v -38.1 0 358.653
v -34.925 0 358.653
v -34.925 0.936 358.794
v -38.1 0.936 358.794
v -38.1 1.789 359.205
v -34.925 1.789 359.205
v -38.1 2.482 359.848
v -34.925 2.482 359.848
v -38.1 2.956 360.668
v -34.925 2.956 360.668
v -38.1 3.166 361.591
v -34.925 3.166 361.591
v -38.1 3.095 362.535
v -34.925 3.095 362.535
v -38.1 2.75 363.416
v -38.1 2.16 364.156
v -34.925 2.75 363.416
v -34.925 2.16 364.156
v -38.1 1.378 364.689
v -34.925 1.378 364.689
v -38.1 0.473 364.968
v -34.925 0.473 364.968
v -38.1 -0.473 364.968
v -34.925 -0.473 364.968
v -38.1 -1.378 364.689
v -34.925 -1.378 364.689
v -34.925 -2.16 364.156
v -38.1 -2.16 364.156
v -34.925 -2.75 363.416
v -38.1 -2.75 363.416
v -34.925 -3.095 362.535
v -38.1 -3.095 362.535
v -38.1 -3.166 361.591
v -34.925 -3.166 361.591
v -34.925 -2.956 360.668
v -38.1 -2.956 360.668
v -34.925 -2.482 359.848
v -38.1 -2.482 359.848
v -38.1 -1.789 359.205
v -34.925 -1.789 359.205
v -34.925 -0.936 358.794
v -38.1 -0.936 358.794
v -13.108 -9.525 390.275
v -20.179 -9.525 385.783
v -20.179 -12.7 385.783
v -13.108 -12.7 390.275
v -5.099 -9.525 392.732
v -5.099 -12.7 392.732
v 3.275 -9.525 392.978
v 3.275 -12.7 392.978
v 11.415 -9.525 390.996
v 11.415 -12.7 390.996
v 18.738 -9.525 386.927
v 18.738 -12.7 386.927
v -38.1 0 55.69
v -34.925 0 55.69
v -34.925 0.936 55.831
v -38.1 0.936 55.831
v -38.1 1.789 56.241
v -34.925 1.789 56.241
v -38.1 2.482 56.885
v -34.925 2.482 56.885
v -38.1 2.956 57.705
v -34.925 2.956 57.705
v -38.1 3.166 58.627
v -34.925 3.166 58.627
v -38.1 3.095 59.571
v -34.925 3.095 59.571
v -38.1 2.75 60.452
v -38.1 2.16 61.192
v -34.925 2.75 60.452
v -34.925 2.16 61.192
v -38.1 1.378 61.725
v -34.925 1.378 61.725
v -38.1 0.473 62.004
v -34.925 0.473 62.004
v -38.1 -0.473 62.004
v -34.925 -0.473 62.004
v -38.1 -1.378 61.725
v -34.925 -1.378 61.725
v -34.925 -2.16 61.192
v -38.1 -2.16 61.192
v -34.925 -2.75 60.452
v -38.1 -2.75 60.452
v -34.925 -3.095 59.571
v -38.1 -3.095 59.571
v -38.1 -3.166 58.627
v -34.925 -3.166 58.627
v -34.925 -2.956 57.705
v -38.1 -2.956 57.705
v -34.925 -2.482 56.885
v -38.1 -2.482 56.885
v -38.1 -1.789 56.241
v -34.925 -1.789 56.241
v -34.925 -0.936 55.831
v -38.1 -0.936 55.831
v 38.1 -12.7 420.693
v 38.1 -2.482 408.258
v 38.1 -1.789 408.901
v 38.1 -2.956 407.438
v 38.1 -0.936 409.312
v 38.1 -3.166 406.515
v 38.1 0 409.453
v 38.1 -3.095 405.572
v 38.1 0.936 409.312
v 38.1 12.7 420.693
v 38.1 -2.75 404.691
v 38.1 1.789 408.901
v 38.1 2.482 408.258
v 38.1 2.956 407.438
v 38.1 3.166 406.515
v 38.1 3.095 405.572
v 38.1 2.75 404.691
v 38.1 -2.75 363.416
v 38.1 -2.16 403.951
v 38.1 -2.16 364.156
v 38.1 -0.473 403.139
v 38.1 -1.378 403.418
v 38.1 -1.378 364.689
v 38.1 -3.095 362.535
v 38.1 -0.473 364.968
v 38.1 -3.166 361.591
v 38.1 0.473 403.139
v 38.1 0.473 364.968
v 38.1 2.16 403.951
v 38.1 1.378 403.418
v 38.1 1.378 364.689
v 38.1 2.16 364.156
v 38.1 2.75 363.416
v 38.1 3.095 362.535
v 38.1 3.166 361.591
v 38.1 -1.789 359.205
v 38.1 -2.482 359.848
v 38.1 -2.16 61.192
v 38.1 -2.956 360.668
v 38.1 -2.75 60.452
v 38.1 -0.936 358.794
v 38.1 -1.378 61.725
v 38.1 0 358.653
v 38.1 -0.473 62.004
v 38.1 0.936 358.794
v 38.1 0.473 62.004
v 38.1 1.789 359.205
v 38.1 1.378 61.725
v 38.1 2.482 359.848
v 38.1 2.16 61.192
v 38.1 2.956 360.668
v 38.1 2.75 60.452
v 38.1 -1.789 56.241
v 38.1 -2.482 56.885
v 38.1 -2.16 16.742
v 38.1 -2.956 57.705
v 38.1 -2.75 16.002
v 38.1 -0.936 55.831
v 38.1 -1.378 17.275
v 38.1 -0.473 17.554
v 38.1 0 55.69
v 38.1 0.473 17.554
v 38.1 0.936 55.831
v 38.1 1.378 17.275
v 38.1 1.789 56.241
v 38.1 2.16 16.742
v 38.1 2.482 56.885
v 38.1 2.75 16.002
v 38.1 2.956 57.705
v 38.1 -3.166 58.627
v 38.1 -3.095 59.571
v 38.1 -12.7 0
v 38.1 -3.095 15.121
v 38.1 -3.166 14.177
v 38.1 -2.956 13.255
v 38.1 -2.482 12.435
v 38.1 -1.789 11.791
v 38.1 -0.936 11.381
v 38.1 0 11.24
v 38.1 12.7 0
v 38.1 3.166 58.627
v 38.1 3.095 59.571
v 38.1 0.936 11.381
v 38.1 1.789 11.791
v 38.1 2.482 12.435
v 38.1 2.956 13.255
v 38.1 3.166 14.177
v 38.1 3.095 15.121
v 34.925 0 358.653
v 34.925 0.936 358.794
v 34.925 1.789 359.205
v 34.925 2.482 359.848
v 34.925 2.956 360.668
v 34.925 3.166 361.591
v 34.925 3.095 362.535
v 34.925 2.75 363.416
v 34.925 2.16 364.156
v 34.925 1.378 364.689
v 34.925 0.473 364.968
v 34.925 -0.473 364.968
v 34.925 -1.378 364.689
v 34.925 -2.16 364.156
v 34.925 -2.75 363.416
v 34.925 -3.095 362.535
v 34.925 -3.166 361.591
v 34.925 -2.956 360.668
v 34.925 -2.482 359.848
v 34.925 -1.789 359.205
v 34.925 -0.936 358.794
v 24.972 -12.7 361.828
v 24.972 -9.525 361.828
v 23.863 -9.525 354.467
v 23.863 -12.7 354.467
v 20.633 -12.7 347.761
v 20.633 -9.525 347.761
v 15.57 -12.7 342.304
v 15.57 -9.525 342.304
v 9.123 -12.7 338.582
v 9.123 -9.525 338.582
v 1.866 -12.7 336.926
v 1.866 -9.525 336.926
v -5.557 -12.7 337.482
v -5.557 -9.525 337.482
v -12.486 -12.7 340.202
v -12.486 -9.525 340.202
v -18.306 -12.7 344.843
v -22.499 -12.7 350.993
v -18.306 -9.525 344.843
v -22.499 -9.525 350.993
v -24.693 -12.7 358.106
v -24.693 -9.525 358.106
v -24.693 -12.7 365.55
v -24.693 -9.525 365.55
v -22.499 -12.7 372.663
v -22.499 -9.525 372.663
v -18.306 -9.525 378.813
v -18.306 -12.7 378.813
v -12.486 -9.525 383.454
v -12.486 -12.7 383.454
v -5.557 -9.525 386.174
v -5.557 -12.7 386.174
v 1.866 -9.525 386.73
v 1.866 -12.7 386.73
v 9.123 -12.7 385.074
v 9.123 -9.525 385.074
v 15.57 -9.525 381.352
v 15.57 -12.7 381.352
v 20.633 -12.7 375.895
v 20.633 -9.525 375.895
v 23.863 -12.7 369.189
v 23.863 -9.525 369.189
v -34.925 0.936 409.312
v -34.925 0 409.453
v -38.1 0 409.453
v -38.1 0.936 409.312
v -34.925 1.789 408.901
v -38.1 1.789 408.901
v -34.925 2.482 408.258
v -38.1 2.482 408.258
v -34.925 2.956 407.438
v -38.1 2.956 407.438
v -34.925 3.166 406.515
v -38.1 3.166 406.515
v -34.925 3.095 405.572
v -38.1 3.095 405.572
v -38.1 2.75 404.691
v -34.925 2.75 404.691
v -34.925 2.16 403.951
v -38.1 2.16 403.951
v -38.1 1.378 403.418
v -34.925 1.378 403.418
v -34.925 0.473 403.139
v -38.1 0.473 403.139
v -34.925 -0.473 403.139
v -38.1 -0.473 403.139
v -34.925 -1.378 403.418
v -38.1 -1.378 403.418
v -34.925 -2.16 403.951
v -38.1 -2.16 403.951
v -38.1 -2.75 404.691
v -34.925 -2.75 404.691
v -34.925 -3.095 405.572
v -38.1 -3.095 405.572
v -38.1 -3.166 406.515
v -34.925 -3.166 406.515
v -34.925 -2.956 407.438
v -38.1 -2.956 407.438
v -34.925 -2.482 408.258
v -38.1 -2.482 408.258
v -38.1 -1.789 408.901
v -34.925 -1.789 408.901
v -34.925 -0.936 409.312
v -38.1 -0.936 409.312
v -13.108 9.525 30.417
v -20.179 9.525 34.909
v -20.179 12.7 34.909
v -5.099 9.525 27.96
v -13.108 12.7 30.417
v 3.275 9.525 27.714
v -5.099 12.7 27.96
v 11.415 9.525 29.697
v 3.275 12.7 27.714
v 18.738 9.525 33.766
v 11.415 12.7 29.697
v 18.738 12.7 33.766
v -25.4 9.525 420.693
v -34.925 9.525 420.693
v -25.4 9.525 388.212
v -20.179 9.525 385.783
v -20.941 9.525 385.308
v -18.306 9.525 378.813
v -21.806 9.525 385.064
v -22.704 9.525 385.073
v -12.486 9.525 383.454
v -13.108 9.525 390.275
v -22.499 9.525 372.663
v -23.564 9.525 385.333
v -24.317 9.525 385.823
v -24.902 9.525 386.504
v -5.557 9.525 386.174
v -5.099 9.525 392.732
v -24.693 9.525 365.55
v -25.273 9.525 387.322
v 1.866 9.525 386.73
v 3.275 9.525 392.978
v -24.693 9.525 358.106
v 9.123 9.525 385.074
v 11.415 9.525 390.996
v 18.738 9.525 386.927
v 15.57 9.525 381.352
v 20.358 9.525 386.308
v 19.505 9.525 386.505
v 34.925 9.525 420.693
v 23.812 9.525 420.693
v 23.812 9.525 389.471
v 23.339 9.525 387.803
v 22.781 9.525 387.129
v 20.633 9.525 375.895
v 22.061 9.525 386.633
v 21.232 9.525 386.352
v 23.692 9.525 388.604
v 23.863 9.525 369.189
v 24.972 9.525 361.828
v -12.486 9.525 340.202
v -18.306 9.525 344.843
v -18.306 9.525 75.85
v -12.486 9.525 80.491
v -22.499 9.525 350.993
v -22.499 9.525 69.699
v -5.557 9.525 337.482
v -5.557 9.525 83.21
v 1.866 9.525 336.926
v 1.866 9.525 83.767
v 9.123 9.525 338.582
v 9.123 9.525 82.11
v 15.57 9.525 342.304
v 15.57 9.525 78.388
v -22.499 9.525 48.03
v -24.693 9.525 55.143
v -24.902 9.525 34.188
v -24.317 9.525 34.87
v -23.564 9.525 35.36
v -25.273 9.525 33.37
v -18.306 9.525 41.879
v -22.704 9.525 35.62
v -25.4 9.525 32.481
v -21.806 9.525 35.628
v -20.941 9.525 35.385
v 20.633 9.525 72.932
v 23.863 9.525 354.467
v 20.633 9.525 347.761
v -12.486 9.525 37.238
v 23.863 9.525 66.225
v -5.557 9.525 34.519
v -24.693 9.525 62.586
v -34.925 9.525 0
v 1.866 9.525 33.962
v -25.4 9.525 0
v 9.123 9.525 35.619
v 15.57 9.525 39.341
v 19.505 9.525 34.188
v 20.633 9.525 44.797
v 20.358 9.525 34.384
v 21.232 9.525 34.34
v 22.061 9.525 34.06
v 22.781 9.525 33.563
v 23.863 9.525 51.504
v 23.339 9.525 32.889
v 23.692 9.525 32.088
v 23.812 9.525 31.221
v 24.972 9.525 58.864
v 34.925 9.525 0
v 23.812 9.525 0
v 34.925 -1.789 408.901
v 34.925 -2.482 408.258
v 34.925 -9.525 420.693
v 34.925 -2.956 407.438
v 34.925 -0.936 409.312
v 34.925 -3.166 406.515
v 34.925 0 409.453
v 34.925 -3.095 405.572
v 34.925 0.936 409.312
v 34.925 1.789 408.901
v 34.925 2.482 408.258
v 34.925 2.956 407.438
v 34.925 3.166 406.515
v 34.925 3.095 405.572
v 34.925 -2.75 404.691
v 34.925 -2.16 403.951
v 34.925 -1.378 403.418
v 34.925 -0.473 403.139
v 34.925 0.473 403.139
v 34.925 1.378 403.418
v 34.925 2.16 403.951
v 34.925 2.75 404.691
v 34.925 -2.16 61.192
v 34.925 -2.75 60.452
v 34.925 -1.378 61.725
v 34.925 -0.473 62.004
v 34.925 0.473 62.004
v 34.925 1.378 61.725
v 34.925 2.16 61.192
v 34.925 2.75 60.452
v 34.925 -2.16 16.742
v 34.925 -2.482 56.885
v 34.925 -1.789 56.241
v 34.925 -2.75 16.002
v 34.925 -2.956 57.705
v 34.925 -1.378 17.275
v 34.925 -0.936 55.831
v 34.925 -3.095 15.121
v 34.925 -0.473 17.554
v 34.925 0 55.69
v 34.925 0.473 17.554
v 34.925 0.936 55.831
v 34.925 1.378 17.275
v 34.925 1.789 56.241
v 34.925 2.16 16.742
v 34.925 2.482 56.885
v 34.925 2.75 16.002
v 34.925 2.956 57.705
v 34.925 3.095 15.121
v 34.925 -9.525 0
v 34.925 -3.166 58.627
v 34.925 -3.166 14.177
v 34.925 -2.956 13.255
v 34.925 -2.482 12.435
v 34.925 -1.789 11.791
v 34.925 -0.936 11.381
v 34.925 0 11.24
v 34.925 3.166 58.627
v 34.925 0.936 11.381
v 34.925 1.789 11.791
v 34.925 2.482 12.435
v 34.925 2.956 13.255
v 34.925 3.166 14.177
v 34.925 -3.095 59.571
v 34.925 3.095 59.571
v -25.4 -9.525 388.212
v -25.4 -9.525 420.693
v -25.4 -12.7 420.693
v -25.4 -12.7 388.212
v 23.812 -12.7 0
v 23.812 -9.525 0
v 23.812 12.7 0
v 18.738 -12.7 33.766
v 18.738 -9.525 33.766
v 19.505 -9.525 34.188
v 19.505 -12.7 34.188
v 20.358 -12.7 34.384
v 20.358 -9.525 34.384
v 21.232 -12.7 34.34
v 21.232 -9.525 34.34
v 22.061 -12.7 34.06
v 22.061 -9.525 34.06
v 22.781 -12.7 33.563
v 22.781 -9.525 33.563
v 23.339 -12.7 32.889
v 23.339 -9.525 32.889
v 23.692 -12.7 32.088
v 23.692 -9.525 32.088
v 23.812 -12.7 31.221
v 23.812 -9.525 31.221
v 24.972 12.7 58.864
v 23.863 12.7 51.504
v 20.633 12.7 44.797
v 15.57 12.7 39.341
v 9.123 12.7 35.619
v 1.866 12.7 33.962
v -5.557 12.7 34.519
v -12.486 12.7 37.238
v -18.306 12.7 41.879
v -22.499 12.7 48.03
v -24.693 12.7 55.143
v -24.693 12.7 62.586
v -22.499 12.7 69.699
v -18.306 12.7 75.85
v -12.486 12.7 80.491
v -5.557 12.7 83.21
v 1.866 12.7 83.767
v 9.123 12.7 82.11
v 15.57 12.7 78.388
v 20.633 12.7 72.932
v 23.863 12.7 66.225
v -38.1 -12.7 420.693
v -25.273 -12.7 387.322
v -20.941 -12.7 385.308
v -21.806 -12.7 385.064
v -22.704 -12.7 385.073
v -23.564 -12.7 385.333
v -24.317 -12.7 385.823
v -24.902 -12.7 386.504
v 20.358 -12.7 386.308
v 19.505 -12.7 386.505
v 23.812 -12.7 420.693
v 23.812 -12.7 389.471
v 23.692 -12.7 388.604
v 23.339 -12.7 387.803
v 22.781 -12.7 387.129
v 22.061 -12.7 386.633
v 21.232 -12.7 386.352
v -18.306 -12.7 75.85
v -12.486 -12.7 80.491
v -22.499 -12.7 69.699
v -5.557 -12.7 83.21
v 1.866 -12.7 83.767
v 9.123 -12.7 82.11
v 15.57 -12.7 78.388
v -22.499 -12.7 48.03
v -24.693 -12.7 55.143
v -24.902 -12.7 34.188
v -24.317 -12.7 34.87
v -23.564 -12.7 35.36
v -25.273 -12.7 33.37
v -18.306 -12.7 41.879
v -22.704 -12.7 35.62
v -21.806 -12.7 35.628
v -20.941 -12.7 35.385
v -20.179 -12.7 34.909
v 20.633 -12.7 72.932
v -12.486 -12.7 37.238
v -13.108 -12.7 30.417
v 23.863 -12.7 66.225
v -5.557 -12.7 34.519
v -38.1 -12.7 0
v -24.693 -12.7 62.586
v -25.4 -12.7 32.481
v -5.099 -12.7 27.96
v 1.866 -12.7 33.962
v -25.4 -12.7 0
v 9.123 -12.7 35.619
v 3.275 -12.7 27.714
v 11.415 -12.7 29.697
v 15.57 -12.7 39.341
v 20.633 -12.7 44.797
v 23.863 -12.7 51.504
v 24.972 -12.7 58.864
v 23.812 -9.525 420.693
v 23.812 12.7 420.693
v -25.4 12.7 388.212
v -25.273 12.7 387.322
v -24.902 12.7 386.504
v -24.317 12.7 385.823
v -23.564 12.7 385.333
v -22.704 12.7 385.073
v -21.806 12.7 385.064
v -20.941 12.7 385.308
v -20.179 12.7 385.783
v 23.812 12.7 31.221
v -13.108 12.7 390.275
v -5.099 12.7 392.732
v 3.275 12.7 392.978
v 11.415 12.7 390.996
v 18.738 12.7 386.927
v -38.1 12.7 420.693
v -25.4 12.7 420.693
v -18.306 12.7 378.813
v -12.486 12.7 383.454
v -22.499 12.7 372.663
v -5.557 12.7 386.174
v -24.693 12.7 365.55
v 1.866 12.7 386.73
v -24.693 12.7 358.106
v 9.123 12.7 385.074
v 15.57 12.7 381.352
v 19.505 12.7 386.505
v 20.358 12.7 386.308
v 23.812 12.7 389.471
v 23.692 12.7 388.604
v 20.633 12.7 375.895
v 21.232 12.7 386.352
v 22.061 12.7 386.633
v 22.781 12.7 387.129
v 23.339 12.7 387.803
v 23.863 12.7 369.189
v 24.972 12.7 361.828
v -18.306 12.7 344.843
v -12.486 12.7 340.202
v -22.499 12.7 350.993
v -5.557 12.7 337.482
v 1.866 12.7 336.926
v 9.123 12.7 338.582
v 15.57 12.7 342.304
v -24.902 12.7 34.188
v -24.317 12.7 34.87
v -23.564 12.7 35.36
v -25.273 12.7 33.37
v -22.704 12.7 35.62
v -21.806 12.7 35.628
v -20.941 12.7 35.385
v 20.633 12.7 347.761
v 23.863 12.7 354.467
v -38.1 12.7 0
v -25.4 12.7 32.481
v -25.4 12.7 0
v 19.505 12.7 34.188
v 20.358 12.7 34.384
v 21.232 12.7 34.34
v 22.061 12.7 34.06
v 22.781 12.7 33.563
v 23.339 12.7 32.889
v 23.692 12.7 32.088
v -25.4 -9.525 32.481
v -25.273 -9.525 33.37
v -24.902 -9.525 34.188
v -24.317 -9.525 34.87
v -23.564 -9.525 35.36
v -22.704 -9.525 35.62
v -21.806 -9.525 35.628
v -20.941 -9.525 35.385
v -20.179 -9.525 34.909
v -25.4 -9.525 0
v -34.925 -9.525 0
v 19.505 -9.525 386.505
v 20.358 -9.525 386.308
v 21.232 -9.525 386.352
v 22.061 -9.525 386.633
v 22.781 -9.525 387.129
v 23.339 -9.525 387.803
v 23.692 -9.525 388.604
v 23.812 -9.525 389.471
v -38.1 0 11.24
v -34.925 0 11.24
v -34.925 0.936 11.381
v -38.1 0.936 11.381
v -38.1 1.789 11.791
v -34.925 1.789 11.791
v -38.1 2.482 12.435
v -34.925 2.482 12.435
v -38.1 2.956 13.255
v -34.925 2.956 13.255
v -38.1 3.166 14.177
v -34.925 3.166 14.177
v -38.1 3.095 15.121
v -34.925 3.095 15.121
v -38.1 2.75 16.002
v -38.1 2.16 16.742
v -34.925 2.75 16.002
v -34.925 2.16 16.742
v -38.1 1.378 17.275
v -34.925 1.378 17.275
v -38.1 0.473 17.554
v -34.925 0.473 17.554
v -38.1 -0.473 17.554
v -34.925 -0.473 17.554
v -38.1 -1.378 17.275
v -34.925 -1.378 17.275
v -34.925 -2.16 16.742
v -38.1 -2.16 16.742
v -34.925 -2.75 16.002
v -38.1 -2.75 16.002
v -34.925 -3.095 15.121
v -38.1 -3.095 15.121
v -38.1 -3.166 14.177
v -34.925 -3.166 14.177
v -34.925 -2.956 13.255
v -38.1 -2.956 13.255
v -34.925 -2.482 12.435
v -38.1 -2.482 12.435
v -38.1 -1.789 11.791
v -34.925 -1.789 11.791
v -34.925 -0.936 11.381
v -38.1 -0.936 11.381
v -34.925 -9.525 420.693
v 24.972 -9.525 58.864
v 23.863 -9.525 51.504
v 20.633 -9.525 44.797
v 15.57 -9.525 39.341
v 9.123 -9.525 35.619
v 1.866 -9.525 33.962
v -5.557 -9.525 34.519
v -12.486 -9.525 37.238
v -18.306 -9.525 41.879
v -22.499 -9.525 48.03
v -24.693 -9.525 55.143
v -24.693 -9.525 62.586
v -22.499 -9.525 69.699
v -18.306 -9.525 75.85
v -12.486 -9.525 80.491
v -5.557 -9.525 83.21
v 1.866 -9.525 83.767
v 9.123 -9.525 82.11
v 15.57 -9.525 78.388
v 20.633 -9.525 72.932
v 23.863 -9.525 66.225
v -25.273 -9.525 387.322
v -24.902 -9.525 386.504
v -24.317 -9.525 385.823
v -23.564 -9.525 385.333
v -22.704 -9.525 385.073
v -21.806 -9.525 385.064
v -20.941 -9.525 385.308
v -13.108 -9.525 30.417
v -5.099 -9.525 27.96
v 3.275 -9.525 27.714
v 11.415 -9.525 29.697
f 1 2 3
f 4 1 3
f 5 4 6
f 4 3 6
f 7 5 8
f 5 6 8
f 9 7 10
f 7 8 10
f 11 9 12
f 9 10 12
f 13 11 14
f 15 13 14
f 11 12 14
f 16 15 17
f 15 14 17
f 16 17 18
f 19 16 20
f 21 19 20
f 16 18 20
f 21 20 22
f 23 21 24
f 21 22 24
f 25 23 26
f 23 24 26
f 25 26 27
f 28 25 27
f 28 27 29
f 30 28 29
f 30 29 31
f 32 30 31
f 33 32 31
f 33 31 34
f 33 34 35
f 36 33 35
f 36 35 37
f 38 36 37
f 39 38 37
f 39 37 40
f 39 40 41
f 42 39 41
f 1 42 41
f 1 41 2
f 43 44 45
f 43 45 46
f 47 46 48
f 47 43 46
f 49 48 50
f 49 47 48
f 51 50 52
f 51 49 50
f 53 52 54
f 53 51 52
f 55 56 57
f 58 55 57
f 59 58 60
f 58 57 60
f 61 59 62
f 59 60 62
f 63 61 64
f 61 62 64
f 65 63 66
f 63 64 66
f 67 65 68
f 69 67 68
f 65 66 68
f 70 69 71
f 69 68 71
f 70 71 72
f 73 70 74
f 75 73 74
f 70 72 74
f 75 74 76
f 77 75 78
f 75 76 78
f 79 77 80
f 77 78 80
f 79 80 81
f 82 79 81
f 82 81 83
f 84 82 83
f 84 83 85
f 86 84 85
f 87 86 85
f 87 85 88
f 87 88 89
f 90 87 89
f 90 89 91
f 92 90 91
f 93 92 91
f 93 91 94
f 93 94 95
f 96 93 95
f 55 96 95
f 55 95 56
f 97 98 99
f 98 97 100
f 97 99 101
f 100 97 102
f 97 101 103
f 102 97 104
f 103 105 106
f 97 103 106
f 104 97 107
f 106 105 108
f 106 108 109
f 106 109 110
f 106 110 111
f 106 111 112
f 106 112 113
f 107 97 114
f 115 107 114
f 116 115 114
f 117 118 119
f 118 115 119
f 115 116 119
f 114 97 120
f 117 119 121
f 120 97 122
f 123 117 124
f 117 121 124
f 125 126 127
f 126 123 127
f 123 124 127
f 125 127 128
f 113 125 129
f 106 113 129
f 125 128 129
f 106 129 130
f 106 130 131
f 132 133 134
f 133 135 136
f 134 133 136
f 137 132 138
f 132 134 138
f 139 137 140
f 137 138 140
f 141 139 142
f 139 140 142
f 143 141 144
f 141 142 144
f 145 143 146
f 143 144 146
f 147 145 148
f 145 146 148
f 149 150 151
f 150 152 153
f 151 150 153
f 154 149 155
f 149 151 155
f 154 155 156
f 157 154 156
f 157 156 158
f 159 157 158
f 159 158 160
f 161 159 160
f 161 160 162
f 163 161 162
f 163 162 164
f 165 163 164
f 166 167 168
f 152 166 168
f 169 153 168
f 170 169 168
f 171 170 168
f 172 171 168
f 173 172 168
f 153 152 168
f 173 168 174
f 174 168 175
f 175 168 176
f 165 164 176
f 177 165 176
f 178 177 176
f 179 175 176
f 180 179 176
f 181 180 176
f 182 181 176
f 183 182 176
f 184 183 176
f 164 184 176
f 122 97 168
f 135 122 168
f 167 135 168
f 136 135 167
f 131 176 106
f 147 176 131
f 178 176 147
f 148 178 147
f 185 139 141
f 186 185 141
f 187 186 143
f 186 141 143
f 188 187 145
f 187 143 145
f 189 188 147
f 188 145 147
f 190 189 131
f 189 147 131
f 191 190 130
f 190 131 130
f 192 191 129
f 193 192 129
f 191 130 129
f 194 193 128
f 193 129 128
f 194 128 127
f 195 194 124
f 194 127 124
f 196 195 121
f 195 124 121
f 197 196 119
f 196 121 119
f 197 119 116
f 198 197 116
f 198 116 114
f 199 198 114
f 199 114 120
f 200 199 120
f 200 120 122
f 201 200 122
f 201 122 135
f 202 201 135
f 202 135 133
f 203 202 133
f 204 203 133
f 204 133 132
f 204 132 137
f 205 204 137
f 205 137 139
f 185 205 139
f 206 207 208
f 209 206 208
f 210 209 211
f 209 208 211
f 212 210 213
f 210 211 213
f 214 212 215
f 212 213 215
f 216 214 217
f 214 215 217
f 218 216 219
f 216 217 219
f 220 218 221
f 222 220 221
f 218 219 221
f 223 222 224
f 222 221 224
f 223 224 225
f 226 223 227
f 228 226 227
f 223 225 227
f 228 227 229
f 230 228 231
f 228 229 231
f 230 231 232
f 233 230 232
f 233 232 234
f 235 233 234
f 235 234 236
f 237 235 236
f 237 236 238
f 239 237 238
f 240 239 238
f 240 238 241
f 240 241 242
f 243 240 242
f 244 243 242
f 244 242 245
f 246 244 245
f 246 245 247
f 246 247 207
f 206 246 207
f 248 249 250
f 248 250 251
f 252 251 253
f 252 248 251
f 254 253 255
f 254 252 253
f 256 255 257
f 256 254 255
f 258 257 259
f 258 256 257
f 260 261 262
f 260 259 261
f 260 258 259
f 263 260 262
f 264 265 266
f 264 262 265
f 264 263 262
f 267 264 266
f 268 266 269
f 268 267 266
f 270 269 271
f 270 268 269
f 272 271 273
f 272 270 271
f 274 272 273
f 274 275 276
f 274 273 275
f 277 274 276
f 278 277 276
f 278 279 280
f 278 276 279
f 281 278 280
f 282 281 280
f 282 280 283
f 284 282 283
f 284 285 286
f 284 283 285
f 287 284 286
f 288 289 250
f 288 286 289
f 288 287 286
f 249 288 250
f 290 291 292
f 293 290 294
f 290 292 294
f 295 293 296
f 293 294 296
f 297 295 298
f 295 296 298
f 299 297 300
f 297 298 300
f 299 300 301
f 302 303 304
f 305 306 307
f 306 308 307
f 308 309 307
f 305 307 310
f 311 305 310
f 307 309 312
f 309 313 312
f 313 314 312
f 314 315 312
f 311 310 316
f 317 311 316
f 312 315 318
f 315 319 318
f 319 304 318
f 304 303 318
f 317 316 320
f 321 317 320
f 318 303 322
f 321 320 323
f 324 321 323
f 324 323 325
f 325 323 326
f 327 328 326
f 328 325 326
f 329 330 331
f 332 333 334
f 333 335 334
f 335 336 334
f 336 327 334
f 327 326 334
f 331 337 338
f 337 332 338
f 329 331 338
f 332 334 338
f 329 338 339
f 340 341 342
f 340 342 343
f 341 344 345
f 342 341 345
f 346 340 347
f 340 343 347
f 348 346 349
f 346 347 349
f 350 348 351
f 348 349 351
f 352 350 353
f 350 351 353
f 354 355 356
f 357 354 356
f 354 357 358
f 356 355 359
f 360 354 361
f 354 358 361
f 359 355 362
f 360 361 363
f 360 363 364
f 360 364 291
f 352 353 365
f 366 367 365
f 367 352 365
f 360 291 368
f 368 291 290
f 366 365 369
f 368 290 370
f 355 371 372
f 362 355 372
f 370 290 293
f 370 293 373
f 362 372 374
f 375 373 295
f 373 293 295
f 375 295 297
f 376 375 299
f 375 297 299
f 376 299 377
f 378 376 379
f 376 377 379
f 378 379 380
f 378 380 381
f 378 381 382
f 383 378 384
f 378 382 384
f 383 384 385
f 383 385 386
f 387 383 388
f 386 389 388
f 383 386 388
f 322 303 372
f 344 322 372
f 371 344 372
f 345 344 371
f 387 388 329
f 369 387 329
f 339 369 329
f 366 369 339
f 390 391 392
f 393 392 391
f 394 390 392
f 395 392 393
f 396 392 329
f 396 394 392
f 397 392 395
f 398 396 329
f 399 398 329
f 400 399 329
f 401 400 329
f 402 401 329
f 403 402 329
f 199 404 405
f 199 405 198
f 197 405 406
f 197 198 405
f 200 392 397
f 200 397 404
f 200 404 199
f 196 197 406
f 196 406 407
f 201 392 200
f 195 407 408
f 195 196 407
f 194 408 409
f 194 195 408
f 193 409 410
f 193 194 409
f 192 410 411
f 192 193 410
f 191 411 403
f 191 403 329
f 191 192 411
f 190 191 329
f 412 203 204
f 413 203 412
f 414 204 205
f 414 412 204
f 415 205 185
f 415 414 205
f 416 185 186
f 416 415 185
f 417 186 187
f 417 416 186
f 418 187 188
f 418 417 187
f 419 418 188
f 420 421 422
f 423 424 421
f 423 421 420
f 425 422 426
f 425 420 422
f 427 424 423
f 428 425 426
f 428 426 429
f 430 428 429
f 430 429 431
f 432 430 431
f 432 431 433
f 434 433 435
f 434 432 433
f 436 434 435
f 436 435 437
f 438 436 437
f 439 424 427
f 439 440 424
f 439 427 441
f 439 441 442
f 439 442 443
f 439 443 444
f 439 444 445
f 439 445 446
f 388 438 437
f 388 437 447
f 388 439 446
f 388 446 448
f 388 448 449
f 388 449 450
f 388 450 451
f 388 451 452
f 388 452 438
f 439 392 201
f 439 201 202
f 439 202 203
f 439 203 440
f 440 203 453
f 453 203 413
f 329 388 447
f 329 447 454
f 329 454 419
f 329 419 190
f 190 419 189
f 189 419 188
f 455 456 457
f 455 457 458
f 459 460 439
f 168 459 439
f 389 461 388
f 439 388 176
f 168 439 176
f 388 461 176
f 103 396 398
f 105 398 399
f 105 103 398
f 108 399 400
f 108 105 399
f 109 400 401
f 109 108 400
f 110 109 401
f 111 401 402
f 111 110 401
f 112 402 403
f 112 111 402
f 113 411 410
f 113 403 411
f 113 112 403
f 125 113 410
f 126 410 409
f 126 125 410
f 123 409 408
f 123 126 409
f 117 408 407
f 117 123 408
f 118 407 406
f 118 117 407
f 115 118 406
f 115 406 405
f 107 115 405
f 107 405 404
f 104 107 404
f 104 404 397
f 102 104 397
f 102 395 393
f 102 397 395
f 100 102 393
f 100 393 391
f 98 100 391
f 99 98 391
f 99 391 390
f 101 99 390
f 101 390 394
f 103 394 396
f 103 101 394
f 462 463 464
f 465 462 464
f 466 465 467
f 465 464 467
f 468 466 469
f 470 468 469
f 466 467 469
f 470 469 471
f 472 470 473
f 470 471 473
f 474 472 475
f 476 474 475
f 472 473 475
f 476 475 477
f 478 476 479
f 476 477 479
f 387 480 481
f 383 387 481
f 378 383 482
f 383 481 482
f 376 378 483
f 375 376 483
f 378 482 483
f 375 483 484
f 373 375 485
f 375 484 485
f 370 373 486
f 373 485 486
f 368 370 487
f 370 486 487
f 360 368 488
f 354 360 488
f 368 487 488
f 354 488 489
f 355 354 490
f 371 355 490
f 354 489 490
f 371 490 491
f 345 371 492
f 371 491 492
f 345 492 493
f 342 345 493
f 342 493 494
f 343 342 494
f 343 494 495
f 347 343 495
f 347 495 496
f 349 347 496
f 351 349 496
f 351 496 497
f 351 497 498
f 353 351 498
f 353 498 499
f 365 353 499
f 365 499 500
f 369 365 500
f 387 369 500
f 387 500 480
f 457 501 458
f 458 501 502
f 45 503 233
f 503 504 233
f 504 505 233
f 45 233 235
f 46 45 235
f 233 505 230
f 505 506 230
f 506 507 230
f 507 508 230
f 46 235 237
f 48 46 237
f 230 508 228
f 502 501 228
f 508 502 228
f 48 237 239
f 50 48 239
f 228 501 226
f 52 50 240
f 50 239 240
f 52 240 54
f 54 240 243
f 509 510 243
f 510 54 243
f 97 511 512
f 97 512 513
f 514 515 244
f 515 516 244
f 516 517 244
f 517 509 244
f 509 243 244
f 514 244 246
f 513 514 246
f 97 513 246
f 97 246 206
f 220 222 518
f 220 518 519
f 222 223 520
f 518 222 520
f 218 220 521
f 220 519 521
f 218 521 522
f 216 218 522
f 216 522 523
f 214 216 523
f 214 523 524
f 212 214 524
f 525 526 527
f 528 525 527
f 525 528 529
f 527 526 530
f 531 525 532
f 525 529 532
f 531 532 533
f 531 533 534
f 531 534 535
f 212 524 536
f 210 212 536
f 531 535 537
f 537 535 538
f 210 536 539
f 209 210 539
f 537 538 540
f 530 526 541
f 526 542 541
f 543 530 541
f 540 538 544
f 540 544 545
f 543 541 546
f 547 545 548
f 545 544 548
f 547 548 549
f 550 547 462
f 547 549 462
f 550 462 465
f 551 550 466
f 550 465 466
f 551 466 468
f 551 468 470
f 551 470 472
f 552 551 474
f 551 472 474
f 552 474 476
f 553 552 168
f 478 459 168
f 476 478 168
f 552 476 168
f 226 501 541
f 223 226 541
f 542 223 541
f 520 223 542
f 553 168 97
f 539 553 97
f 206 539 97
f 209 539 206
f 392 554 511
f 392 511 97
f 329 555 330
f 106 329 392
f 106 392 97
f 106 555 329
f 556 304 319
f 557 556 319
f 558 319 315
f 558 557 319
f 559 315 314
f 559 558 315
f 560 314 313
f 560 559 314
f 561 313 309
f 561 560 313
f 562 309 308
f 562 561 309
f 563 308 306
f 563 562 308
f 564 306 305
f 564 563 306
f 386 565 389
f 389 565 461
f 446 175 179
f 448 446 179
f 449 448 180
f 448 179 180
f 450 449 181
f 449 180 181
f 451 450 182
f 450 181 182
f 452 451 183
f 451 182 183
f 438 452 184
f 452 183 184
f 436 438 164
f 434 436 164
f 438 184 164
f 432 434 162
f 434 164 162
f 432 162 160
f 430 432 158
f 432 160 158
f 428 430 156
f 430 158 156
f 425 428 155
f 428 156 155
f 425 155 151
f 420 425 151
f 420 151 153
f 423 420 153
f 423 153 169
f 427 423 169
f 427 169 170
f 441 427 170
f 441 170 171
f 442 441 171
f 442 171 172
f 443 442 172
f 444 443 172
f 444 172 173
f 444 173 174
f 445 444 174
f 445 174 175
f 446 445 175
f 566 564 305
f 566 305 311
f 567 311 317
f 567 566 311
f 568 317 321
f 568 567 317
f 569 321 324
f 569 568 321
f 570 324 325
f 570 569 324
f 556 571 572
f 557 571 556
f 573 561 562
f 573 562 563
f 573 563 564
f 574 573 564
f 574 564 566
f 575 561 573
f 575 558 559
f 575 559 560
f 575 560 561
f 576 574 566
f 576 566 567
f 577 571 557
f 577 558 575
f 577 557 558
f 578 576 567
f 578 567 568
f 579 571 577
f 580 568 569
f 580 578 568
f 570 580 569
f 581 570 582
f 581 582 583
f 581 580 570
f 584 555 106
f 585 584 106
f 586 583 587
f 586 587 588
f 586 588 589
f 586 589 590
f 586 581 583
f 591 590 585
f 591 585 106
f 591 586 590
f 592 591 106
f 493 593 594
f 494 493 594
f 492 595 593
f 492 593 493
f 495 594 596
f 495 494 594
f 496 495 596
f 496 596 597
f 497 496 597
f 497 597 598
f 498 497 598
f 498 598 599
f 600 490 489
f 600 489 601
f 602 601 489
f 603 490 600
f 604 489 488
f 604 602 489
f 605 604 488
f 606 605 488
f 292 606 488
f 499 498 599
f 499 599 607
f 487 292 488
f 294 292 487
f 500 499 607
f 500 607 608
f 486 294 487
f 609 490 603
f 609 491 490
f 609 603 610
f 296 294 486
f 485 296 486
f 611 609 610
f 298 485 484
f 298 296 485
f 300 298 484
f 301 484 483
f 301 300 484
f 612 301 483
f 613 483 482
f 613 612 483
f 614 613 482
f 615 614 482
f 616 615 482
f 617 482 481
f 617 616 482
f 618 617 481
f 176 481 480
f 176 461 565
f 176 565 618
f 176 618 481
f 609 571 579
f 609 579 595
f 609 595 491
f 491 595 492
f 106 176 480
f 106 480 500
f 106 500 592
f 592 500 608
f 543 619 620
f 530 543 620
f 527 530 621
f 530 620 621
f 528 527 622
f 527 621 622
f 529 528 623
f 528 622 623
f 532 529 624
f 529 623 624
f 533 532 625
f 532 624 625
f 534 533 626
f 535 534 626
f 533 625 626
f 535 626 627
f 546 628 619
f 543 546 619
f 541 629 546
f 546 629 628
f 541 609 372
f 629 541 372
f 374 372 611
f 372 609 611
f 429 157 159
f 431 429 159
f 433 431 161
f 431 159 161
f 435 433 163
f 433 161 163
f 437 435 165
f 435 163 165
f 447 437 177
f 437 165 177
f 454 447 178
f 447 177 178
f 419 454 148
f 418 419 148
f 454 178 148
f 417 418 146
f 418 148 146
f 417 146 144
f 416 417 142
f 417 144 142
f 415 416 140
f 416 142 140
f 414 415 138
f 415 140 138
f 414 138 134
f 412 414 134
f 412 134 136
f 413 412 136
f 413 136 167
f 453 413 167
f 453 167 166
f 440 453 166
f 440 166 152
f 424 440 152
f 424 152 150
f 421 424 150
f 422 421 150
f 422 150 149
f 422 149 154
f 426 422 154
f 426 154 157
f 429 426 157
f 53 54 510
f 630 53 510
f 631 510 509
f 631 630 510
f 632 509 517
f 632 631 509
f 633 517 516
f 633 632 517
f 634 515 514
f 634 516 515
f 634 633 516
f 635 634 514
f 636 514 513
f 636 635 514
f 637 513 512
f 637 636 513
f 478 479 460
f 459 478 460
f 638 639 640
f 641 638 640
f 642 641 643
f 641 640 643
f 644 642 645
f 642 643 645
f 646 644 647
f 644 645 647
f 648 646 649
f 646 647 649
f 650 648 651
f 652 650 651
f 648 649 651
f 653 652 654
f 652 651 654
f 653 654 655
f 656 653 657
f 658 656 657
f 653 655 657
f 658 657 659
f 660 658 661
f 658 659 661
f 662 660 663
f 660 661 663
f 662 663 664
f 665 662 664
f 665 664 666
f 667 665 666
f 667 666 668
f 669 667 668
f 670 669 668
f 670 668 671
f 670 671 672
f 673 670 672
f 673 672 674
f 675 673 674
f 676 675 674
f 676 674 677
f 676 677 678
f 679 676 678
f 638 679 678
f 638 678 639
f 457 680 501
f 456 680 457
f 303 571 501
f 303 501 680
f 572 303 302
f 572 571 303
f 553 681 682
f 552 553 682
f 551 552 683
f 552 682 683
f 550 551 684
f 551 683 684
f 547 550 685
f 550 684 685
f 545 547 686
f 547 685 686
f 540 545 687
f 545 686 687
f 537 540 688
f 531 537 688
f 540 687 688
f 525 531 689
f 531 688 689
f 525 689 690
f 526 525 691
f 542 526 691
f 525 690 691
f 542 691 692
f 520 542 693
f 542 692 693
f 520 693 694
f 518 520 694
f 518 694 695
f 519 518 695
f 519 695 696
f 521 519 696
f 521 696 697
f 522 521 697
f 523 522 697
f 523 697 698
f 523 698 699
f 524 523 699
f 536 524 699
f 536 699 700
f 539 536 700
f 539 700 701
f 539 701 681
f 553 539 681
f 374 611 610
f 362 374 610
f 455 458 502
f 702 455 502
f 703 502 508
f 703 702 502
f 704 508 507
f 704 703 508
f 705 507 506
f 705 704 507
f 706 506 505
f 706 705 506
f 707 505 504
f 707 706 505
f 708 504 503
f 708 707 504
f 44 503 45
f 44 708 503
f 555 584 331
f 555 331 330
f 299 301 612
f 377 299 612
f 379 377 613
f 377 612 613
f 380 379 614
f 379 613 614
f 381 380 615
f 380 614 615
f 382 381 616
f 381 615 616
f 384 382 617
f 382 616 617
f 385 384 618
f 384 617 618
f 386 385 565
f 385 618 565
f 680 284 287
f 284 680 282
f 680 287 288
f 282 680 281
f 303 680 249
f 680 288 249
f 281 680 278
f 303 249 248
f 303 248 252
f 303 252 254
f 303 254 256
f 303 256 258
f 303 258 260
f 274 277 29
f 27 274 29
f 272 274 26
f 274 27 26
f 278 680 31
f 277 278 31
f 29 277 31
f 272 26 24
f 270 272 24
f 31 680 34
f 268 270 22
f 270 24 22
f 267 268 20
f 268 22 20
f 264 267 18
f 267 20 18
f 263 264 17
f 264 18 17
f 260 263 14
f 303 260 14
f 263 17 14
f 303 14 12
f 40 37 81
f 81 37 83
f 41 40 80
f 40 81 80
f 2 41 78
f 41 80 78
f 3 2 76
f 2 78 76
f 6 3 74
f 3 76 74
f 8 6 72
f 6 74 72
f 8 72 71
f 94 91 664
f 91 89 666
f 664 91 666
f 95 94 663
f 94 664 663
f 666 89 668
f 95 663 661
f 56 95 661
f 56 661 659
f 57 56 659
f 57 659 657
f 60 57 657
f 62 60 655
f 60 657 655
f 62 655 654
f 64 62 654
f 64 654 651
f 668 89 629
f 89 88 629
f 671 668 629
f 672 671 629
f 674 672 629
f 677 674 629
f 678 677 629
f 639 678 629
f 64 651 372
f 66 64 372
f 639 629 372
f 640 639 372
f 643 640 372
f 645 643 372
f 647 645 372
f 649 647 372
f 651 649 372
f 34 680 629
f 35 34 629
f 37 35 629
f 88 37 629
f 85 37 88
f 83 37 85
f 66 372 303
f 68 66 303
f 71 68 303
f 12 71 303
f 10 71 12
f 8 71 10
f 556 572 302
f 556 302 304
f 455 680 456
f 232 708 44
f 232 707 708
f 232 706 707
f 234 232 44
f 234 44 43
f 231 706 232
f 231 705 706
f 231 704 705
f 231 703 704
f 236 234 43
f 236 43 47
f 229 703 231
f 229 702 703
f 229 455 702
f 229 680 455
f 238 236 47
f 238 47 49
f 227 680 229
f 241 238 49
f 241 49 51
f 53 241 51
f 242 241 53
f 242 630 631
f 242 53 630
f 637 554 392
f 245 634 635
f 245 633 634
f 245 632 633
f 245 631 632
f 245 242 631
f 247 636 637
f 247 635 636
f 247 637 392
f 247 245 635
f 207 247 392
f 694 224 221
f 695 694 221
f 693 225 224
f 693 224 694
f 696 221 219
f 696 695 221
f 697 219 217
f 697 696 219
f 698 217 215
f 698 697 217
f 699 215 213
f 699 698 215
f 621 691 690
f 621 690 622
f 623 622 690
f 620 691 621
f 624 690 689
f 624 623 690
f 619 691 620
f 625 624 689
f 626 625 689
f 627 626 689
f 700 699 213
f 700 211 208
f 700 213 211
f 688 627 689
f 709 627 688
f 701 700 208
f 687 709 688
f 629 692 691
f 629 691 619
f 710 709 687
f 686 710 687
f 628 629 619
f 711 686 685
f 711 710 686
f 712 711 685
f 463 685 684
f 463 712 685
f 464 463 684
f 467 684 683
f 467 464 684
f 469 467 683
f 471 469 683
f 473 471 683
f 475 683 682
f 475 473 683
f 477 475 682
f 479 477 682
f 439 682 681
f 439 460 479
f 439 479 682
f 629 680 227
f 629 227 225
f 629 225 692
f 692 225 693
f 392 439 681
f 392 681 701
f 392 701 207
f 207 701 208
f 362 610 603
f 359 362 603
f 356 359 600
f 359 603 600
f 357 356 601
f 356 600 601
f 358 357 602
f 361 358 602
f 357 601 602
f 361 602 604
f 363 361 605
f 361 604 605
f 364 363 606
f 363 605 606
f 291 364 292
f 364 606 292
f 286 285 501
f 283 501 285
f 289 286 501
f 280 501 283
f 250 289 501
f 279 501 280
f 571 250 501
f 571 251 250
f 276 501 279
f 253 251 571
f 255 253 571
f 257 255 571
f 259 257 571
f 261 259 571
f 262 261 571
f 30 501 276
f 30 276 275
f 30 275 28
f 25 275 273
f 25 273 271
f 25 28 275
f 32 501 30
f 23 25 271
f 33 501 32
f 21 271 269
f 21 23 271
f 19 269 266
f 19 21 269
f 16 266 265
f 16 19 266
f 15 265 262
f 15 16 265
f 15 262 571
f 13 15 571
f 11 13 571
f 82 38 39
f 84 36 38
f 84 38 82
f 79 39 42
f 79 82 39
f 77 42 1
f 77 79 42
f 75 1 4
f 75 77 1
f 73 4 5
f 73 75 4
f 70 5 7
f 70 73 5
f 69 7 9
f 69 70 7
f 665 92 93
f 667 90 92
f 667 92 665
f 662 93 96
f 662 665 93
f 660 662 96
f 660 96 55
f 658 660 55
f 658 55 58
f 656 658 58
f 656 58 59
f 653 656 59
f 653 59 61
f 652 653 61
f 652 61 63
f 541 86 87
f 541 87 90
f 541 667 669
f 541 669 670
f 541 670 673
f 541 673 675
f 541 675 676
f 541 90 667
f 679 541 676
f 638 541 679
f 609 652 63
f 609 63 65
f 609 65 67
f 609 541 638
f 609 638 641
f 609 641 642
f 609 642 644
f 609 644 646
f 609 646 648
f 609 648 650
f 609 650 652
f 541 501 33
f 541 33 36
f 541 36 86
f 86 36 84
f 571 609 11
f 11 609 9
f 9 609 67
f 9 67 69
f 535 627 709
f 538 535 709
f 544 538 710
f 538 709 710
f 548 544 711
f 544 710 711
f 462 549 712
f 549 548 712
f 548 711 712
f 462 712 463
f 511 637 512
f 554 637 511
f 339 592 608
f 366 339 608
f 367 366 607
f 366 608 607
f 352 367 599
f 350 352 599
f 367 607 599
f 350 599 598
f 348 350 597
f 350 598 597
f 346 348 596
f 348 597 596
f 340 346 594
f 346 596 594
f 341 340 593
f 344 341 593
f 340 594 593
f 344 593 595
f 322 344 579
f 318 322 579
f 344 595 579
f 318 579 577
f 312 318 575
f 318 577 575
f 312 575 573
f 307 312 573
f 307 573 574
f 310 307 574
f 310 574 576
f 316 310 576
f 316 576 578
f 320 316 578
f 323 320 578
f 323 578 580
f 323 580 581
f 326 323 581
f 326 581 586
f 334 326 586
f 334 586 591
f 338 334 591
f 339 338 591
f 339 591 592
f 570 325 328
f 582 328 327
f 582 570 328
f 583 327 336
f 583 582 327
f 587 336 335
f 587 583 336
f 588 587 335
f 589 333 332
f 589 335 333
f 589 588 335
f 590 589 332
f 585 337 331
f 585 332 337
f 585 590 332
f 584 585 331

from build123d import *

# Parameters (mm, degrees)
SKETCH1_W           = 76.2
SKETCH1_H           = 25.4
SKETCH1_W_2         = 69.85
SKETCH1_H_2         = 19.05
EXTRUDE_THIN1_DEPTH = 420.69258
SKETCH4_R           = 24.97201
CUT_EXTRUDE3_DEPTH  = 26.4
CUT_EXTRUDE7_DEPTH  = 26.4
SKETCH7_R           = 3.175
CUT_EXTRUDE8_DEPTH  = 77.2
SKETCH8_R           = 3.175
CUT_EXTRUDE9_DEPTH  = 77.2


with BuildPart() as part:
    # Sketch1 → Extrude-Thin1 (new body)
    with BuildSketch(Plane.XY):
        Rectangle(SKETCH1_W, SKETCH1_H)
        Rectangle(SKETCH1_W_2, SKETCH1_H_2, mode=Mode.SUBTRACT)
    extrude(amount=EXTRUDE_THIN1_DEPTH)

    # Sketch4 → Cut-Extrude3 (cut, through all)
    with BuildSketch(Plane(origin=(0, 12.7, 0), x_dir=(1, 0, 0), z_dir=(0, 1, 0))):
        with Locations((0, -361.82808)):
            Circle(SKETCH4_R)
        with Locations((0, -58.8645)):
            Circle(SKETCH4_R)
    extrude(amount=-CUT_EXTRUDE3_DEPTH, mode=Mode.SUBTRACT)

    # Sketch6 → Cut-Extrude7 (cut, through all)
    with BuildSketch(Plane(origin=(0, 12.7, 0), x_dir=(1, 0, 0), z_dir=(0, 1, 0))):
        with BuildLine():
            Line((23.8125, 0), (-25.4, 0))
            Line((-25.4, 0), (-25.4, -32.480924163))
            ThreePointArc((-25.4, -32.480924163), (-23.564047105, -35.359739519), (-20.179478519, -34.909188331))
            ThreePointArc((-20.179478519, -34.909188331), (-0.919958513, -27.556002962), (18.738087196, -33.765647463))
            ThreePointArc((18.738087196, -33.765647463), (22.060523075, -34.059710885), (23.8125, -31.221466652))
            Line((23.8125, -31.221466652), (23.8125, 0))
        make_face()
    cut_extrude7 = extrude(amount=-CUT_EXTRUDE7_DEPTH, mode=Mode.SUBTRACT)

    # Sketch7 → Cut-Extrude8 (cut, through all)
    with BuildSketch(Plane(origin=(38.1, 0, 0), x_dir=(0, 0, -1), z_dir=(1, 0, 0))):
        with Locations((-14.4145, 0)):
            Circle(SKETCH7_R)
    cut_extrude8 = extrude(amount=-CUT_EXTRUDE8_DEPTH, mode=Mode.SUBTRACT)

    # Mirror3: Cut-Extrude7, Cut-Extrude8 across plane
    add(cut_extrude7.mirror(Plane.XY.offset(210.34629)), mode=Mode.SUBTRACT)
    add(cut_extrude8.mirror(Plane.XY.offset(210.34629)), mode=Mode.SUBTRACT)

    # Sketch8 → Cut-Extrude9 (cut, through all)
    with BuildSketch(Plane(origin=(38.1, 0, 0), x_dir=(0, 0, -1), z_dir=(1, 0, 0))):
        with Locations((-58.8645, 0)):
            Circle(SKETCH8_R)
        with Locations((-361.82808, 0)):
            Circle(SKETCH8_R)
    extrude(amount=-CUT_EXTRUDE9_DEPTH, mode=Mode.SUBTRACT)


solid = part.part
